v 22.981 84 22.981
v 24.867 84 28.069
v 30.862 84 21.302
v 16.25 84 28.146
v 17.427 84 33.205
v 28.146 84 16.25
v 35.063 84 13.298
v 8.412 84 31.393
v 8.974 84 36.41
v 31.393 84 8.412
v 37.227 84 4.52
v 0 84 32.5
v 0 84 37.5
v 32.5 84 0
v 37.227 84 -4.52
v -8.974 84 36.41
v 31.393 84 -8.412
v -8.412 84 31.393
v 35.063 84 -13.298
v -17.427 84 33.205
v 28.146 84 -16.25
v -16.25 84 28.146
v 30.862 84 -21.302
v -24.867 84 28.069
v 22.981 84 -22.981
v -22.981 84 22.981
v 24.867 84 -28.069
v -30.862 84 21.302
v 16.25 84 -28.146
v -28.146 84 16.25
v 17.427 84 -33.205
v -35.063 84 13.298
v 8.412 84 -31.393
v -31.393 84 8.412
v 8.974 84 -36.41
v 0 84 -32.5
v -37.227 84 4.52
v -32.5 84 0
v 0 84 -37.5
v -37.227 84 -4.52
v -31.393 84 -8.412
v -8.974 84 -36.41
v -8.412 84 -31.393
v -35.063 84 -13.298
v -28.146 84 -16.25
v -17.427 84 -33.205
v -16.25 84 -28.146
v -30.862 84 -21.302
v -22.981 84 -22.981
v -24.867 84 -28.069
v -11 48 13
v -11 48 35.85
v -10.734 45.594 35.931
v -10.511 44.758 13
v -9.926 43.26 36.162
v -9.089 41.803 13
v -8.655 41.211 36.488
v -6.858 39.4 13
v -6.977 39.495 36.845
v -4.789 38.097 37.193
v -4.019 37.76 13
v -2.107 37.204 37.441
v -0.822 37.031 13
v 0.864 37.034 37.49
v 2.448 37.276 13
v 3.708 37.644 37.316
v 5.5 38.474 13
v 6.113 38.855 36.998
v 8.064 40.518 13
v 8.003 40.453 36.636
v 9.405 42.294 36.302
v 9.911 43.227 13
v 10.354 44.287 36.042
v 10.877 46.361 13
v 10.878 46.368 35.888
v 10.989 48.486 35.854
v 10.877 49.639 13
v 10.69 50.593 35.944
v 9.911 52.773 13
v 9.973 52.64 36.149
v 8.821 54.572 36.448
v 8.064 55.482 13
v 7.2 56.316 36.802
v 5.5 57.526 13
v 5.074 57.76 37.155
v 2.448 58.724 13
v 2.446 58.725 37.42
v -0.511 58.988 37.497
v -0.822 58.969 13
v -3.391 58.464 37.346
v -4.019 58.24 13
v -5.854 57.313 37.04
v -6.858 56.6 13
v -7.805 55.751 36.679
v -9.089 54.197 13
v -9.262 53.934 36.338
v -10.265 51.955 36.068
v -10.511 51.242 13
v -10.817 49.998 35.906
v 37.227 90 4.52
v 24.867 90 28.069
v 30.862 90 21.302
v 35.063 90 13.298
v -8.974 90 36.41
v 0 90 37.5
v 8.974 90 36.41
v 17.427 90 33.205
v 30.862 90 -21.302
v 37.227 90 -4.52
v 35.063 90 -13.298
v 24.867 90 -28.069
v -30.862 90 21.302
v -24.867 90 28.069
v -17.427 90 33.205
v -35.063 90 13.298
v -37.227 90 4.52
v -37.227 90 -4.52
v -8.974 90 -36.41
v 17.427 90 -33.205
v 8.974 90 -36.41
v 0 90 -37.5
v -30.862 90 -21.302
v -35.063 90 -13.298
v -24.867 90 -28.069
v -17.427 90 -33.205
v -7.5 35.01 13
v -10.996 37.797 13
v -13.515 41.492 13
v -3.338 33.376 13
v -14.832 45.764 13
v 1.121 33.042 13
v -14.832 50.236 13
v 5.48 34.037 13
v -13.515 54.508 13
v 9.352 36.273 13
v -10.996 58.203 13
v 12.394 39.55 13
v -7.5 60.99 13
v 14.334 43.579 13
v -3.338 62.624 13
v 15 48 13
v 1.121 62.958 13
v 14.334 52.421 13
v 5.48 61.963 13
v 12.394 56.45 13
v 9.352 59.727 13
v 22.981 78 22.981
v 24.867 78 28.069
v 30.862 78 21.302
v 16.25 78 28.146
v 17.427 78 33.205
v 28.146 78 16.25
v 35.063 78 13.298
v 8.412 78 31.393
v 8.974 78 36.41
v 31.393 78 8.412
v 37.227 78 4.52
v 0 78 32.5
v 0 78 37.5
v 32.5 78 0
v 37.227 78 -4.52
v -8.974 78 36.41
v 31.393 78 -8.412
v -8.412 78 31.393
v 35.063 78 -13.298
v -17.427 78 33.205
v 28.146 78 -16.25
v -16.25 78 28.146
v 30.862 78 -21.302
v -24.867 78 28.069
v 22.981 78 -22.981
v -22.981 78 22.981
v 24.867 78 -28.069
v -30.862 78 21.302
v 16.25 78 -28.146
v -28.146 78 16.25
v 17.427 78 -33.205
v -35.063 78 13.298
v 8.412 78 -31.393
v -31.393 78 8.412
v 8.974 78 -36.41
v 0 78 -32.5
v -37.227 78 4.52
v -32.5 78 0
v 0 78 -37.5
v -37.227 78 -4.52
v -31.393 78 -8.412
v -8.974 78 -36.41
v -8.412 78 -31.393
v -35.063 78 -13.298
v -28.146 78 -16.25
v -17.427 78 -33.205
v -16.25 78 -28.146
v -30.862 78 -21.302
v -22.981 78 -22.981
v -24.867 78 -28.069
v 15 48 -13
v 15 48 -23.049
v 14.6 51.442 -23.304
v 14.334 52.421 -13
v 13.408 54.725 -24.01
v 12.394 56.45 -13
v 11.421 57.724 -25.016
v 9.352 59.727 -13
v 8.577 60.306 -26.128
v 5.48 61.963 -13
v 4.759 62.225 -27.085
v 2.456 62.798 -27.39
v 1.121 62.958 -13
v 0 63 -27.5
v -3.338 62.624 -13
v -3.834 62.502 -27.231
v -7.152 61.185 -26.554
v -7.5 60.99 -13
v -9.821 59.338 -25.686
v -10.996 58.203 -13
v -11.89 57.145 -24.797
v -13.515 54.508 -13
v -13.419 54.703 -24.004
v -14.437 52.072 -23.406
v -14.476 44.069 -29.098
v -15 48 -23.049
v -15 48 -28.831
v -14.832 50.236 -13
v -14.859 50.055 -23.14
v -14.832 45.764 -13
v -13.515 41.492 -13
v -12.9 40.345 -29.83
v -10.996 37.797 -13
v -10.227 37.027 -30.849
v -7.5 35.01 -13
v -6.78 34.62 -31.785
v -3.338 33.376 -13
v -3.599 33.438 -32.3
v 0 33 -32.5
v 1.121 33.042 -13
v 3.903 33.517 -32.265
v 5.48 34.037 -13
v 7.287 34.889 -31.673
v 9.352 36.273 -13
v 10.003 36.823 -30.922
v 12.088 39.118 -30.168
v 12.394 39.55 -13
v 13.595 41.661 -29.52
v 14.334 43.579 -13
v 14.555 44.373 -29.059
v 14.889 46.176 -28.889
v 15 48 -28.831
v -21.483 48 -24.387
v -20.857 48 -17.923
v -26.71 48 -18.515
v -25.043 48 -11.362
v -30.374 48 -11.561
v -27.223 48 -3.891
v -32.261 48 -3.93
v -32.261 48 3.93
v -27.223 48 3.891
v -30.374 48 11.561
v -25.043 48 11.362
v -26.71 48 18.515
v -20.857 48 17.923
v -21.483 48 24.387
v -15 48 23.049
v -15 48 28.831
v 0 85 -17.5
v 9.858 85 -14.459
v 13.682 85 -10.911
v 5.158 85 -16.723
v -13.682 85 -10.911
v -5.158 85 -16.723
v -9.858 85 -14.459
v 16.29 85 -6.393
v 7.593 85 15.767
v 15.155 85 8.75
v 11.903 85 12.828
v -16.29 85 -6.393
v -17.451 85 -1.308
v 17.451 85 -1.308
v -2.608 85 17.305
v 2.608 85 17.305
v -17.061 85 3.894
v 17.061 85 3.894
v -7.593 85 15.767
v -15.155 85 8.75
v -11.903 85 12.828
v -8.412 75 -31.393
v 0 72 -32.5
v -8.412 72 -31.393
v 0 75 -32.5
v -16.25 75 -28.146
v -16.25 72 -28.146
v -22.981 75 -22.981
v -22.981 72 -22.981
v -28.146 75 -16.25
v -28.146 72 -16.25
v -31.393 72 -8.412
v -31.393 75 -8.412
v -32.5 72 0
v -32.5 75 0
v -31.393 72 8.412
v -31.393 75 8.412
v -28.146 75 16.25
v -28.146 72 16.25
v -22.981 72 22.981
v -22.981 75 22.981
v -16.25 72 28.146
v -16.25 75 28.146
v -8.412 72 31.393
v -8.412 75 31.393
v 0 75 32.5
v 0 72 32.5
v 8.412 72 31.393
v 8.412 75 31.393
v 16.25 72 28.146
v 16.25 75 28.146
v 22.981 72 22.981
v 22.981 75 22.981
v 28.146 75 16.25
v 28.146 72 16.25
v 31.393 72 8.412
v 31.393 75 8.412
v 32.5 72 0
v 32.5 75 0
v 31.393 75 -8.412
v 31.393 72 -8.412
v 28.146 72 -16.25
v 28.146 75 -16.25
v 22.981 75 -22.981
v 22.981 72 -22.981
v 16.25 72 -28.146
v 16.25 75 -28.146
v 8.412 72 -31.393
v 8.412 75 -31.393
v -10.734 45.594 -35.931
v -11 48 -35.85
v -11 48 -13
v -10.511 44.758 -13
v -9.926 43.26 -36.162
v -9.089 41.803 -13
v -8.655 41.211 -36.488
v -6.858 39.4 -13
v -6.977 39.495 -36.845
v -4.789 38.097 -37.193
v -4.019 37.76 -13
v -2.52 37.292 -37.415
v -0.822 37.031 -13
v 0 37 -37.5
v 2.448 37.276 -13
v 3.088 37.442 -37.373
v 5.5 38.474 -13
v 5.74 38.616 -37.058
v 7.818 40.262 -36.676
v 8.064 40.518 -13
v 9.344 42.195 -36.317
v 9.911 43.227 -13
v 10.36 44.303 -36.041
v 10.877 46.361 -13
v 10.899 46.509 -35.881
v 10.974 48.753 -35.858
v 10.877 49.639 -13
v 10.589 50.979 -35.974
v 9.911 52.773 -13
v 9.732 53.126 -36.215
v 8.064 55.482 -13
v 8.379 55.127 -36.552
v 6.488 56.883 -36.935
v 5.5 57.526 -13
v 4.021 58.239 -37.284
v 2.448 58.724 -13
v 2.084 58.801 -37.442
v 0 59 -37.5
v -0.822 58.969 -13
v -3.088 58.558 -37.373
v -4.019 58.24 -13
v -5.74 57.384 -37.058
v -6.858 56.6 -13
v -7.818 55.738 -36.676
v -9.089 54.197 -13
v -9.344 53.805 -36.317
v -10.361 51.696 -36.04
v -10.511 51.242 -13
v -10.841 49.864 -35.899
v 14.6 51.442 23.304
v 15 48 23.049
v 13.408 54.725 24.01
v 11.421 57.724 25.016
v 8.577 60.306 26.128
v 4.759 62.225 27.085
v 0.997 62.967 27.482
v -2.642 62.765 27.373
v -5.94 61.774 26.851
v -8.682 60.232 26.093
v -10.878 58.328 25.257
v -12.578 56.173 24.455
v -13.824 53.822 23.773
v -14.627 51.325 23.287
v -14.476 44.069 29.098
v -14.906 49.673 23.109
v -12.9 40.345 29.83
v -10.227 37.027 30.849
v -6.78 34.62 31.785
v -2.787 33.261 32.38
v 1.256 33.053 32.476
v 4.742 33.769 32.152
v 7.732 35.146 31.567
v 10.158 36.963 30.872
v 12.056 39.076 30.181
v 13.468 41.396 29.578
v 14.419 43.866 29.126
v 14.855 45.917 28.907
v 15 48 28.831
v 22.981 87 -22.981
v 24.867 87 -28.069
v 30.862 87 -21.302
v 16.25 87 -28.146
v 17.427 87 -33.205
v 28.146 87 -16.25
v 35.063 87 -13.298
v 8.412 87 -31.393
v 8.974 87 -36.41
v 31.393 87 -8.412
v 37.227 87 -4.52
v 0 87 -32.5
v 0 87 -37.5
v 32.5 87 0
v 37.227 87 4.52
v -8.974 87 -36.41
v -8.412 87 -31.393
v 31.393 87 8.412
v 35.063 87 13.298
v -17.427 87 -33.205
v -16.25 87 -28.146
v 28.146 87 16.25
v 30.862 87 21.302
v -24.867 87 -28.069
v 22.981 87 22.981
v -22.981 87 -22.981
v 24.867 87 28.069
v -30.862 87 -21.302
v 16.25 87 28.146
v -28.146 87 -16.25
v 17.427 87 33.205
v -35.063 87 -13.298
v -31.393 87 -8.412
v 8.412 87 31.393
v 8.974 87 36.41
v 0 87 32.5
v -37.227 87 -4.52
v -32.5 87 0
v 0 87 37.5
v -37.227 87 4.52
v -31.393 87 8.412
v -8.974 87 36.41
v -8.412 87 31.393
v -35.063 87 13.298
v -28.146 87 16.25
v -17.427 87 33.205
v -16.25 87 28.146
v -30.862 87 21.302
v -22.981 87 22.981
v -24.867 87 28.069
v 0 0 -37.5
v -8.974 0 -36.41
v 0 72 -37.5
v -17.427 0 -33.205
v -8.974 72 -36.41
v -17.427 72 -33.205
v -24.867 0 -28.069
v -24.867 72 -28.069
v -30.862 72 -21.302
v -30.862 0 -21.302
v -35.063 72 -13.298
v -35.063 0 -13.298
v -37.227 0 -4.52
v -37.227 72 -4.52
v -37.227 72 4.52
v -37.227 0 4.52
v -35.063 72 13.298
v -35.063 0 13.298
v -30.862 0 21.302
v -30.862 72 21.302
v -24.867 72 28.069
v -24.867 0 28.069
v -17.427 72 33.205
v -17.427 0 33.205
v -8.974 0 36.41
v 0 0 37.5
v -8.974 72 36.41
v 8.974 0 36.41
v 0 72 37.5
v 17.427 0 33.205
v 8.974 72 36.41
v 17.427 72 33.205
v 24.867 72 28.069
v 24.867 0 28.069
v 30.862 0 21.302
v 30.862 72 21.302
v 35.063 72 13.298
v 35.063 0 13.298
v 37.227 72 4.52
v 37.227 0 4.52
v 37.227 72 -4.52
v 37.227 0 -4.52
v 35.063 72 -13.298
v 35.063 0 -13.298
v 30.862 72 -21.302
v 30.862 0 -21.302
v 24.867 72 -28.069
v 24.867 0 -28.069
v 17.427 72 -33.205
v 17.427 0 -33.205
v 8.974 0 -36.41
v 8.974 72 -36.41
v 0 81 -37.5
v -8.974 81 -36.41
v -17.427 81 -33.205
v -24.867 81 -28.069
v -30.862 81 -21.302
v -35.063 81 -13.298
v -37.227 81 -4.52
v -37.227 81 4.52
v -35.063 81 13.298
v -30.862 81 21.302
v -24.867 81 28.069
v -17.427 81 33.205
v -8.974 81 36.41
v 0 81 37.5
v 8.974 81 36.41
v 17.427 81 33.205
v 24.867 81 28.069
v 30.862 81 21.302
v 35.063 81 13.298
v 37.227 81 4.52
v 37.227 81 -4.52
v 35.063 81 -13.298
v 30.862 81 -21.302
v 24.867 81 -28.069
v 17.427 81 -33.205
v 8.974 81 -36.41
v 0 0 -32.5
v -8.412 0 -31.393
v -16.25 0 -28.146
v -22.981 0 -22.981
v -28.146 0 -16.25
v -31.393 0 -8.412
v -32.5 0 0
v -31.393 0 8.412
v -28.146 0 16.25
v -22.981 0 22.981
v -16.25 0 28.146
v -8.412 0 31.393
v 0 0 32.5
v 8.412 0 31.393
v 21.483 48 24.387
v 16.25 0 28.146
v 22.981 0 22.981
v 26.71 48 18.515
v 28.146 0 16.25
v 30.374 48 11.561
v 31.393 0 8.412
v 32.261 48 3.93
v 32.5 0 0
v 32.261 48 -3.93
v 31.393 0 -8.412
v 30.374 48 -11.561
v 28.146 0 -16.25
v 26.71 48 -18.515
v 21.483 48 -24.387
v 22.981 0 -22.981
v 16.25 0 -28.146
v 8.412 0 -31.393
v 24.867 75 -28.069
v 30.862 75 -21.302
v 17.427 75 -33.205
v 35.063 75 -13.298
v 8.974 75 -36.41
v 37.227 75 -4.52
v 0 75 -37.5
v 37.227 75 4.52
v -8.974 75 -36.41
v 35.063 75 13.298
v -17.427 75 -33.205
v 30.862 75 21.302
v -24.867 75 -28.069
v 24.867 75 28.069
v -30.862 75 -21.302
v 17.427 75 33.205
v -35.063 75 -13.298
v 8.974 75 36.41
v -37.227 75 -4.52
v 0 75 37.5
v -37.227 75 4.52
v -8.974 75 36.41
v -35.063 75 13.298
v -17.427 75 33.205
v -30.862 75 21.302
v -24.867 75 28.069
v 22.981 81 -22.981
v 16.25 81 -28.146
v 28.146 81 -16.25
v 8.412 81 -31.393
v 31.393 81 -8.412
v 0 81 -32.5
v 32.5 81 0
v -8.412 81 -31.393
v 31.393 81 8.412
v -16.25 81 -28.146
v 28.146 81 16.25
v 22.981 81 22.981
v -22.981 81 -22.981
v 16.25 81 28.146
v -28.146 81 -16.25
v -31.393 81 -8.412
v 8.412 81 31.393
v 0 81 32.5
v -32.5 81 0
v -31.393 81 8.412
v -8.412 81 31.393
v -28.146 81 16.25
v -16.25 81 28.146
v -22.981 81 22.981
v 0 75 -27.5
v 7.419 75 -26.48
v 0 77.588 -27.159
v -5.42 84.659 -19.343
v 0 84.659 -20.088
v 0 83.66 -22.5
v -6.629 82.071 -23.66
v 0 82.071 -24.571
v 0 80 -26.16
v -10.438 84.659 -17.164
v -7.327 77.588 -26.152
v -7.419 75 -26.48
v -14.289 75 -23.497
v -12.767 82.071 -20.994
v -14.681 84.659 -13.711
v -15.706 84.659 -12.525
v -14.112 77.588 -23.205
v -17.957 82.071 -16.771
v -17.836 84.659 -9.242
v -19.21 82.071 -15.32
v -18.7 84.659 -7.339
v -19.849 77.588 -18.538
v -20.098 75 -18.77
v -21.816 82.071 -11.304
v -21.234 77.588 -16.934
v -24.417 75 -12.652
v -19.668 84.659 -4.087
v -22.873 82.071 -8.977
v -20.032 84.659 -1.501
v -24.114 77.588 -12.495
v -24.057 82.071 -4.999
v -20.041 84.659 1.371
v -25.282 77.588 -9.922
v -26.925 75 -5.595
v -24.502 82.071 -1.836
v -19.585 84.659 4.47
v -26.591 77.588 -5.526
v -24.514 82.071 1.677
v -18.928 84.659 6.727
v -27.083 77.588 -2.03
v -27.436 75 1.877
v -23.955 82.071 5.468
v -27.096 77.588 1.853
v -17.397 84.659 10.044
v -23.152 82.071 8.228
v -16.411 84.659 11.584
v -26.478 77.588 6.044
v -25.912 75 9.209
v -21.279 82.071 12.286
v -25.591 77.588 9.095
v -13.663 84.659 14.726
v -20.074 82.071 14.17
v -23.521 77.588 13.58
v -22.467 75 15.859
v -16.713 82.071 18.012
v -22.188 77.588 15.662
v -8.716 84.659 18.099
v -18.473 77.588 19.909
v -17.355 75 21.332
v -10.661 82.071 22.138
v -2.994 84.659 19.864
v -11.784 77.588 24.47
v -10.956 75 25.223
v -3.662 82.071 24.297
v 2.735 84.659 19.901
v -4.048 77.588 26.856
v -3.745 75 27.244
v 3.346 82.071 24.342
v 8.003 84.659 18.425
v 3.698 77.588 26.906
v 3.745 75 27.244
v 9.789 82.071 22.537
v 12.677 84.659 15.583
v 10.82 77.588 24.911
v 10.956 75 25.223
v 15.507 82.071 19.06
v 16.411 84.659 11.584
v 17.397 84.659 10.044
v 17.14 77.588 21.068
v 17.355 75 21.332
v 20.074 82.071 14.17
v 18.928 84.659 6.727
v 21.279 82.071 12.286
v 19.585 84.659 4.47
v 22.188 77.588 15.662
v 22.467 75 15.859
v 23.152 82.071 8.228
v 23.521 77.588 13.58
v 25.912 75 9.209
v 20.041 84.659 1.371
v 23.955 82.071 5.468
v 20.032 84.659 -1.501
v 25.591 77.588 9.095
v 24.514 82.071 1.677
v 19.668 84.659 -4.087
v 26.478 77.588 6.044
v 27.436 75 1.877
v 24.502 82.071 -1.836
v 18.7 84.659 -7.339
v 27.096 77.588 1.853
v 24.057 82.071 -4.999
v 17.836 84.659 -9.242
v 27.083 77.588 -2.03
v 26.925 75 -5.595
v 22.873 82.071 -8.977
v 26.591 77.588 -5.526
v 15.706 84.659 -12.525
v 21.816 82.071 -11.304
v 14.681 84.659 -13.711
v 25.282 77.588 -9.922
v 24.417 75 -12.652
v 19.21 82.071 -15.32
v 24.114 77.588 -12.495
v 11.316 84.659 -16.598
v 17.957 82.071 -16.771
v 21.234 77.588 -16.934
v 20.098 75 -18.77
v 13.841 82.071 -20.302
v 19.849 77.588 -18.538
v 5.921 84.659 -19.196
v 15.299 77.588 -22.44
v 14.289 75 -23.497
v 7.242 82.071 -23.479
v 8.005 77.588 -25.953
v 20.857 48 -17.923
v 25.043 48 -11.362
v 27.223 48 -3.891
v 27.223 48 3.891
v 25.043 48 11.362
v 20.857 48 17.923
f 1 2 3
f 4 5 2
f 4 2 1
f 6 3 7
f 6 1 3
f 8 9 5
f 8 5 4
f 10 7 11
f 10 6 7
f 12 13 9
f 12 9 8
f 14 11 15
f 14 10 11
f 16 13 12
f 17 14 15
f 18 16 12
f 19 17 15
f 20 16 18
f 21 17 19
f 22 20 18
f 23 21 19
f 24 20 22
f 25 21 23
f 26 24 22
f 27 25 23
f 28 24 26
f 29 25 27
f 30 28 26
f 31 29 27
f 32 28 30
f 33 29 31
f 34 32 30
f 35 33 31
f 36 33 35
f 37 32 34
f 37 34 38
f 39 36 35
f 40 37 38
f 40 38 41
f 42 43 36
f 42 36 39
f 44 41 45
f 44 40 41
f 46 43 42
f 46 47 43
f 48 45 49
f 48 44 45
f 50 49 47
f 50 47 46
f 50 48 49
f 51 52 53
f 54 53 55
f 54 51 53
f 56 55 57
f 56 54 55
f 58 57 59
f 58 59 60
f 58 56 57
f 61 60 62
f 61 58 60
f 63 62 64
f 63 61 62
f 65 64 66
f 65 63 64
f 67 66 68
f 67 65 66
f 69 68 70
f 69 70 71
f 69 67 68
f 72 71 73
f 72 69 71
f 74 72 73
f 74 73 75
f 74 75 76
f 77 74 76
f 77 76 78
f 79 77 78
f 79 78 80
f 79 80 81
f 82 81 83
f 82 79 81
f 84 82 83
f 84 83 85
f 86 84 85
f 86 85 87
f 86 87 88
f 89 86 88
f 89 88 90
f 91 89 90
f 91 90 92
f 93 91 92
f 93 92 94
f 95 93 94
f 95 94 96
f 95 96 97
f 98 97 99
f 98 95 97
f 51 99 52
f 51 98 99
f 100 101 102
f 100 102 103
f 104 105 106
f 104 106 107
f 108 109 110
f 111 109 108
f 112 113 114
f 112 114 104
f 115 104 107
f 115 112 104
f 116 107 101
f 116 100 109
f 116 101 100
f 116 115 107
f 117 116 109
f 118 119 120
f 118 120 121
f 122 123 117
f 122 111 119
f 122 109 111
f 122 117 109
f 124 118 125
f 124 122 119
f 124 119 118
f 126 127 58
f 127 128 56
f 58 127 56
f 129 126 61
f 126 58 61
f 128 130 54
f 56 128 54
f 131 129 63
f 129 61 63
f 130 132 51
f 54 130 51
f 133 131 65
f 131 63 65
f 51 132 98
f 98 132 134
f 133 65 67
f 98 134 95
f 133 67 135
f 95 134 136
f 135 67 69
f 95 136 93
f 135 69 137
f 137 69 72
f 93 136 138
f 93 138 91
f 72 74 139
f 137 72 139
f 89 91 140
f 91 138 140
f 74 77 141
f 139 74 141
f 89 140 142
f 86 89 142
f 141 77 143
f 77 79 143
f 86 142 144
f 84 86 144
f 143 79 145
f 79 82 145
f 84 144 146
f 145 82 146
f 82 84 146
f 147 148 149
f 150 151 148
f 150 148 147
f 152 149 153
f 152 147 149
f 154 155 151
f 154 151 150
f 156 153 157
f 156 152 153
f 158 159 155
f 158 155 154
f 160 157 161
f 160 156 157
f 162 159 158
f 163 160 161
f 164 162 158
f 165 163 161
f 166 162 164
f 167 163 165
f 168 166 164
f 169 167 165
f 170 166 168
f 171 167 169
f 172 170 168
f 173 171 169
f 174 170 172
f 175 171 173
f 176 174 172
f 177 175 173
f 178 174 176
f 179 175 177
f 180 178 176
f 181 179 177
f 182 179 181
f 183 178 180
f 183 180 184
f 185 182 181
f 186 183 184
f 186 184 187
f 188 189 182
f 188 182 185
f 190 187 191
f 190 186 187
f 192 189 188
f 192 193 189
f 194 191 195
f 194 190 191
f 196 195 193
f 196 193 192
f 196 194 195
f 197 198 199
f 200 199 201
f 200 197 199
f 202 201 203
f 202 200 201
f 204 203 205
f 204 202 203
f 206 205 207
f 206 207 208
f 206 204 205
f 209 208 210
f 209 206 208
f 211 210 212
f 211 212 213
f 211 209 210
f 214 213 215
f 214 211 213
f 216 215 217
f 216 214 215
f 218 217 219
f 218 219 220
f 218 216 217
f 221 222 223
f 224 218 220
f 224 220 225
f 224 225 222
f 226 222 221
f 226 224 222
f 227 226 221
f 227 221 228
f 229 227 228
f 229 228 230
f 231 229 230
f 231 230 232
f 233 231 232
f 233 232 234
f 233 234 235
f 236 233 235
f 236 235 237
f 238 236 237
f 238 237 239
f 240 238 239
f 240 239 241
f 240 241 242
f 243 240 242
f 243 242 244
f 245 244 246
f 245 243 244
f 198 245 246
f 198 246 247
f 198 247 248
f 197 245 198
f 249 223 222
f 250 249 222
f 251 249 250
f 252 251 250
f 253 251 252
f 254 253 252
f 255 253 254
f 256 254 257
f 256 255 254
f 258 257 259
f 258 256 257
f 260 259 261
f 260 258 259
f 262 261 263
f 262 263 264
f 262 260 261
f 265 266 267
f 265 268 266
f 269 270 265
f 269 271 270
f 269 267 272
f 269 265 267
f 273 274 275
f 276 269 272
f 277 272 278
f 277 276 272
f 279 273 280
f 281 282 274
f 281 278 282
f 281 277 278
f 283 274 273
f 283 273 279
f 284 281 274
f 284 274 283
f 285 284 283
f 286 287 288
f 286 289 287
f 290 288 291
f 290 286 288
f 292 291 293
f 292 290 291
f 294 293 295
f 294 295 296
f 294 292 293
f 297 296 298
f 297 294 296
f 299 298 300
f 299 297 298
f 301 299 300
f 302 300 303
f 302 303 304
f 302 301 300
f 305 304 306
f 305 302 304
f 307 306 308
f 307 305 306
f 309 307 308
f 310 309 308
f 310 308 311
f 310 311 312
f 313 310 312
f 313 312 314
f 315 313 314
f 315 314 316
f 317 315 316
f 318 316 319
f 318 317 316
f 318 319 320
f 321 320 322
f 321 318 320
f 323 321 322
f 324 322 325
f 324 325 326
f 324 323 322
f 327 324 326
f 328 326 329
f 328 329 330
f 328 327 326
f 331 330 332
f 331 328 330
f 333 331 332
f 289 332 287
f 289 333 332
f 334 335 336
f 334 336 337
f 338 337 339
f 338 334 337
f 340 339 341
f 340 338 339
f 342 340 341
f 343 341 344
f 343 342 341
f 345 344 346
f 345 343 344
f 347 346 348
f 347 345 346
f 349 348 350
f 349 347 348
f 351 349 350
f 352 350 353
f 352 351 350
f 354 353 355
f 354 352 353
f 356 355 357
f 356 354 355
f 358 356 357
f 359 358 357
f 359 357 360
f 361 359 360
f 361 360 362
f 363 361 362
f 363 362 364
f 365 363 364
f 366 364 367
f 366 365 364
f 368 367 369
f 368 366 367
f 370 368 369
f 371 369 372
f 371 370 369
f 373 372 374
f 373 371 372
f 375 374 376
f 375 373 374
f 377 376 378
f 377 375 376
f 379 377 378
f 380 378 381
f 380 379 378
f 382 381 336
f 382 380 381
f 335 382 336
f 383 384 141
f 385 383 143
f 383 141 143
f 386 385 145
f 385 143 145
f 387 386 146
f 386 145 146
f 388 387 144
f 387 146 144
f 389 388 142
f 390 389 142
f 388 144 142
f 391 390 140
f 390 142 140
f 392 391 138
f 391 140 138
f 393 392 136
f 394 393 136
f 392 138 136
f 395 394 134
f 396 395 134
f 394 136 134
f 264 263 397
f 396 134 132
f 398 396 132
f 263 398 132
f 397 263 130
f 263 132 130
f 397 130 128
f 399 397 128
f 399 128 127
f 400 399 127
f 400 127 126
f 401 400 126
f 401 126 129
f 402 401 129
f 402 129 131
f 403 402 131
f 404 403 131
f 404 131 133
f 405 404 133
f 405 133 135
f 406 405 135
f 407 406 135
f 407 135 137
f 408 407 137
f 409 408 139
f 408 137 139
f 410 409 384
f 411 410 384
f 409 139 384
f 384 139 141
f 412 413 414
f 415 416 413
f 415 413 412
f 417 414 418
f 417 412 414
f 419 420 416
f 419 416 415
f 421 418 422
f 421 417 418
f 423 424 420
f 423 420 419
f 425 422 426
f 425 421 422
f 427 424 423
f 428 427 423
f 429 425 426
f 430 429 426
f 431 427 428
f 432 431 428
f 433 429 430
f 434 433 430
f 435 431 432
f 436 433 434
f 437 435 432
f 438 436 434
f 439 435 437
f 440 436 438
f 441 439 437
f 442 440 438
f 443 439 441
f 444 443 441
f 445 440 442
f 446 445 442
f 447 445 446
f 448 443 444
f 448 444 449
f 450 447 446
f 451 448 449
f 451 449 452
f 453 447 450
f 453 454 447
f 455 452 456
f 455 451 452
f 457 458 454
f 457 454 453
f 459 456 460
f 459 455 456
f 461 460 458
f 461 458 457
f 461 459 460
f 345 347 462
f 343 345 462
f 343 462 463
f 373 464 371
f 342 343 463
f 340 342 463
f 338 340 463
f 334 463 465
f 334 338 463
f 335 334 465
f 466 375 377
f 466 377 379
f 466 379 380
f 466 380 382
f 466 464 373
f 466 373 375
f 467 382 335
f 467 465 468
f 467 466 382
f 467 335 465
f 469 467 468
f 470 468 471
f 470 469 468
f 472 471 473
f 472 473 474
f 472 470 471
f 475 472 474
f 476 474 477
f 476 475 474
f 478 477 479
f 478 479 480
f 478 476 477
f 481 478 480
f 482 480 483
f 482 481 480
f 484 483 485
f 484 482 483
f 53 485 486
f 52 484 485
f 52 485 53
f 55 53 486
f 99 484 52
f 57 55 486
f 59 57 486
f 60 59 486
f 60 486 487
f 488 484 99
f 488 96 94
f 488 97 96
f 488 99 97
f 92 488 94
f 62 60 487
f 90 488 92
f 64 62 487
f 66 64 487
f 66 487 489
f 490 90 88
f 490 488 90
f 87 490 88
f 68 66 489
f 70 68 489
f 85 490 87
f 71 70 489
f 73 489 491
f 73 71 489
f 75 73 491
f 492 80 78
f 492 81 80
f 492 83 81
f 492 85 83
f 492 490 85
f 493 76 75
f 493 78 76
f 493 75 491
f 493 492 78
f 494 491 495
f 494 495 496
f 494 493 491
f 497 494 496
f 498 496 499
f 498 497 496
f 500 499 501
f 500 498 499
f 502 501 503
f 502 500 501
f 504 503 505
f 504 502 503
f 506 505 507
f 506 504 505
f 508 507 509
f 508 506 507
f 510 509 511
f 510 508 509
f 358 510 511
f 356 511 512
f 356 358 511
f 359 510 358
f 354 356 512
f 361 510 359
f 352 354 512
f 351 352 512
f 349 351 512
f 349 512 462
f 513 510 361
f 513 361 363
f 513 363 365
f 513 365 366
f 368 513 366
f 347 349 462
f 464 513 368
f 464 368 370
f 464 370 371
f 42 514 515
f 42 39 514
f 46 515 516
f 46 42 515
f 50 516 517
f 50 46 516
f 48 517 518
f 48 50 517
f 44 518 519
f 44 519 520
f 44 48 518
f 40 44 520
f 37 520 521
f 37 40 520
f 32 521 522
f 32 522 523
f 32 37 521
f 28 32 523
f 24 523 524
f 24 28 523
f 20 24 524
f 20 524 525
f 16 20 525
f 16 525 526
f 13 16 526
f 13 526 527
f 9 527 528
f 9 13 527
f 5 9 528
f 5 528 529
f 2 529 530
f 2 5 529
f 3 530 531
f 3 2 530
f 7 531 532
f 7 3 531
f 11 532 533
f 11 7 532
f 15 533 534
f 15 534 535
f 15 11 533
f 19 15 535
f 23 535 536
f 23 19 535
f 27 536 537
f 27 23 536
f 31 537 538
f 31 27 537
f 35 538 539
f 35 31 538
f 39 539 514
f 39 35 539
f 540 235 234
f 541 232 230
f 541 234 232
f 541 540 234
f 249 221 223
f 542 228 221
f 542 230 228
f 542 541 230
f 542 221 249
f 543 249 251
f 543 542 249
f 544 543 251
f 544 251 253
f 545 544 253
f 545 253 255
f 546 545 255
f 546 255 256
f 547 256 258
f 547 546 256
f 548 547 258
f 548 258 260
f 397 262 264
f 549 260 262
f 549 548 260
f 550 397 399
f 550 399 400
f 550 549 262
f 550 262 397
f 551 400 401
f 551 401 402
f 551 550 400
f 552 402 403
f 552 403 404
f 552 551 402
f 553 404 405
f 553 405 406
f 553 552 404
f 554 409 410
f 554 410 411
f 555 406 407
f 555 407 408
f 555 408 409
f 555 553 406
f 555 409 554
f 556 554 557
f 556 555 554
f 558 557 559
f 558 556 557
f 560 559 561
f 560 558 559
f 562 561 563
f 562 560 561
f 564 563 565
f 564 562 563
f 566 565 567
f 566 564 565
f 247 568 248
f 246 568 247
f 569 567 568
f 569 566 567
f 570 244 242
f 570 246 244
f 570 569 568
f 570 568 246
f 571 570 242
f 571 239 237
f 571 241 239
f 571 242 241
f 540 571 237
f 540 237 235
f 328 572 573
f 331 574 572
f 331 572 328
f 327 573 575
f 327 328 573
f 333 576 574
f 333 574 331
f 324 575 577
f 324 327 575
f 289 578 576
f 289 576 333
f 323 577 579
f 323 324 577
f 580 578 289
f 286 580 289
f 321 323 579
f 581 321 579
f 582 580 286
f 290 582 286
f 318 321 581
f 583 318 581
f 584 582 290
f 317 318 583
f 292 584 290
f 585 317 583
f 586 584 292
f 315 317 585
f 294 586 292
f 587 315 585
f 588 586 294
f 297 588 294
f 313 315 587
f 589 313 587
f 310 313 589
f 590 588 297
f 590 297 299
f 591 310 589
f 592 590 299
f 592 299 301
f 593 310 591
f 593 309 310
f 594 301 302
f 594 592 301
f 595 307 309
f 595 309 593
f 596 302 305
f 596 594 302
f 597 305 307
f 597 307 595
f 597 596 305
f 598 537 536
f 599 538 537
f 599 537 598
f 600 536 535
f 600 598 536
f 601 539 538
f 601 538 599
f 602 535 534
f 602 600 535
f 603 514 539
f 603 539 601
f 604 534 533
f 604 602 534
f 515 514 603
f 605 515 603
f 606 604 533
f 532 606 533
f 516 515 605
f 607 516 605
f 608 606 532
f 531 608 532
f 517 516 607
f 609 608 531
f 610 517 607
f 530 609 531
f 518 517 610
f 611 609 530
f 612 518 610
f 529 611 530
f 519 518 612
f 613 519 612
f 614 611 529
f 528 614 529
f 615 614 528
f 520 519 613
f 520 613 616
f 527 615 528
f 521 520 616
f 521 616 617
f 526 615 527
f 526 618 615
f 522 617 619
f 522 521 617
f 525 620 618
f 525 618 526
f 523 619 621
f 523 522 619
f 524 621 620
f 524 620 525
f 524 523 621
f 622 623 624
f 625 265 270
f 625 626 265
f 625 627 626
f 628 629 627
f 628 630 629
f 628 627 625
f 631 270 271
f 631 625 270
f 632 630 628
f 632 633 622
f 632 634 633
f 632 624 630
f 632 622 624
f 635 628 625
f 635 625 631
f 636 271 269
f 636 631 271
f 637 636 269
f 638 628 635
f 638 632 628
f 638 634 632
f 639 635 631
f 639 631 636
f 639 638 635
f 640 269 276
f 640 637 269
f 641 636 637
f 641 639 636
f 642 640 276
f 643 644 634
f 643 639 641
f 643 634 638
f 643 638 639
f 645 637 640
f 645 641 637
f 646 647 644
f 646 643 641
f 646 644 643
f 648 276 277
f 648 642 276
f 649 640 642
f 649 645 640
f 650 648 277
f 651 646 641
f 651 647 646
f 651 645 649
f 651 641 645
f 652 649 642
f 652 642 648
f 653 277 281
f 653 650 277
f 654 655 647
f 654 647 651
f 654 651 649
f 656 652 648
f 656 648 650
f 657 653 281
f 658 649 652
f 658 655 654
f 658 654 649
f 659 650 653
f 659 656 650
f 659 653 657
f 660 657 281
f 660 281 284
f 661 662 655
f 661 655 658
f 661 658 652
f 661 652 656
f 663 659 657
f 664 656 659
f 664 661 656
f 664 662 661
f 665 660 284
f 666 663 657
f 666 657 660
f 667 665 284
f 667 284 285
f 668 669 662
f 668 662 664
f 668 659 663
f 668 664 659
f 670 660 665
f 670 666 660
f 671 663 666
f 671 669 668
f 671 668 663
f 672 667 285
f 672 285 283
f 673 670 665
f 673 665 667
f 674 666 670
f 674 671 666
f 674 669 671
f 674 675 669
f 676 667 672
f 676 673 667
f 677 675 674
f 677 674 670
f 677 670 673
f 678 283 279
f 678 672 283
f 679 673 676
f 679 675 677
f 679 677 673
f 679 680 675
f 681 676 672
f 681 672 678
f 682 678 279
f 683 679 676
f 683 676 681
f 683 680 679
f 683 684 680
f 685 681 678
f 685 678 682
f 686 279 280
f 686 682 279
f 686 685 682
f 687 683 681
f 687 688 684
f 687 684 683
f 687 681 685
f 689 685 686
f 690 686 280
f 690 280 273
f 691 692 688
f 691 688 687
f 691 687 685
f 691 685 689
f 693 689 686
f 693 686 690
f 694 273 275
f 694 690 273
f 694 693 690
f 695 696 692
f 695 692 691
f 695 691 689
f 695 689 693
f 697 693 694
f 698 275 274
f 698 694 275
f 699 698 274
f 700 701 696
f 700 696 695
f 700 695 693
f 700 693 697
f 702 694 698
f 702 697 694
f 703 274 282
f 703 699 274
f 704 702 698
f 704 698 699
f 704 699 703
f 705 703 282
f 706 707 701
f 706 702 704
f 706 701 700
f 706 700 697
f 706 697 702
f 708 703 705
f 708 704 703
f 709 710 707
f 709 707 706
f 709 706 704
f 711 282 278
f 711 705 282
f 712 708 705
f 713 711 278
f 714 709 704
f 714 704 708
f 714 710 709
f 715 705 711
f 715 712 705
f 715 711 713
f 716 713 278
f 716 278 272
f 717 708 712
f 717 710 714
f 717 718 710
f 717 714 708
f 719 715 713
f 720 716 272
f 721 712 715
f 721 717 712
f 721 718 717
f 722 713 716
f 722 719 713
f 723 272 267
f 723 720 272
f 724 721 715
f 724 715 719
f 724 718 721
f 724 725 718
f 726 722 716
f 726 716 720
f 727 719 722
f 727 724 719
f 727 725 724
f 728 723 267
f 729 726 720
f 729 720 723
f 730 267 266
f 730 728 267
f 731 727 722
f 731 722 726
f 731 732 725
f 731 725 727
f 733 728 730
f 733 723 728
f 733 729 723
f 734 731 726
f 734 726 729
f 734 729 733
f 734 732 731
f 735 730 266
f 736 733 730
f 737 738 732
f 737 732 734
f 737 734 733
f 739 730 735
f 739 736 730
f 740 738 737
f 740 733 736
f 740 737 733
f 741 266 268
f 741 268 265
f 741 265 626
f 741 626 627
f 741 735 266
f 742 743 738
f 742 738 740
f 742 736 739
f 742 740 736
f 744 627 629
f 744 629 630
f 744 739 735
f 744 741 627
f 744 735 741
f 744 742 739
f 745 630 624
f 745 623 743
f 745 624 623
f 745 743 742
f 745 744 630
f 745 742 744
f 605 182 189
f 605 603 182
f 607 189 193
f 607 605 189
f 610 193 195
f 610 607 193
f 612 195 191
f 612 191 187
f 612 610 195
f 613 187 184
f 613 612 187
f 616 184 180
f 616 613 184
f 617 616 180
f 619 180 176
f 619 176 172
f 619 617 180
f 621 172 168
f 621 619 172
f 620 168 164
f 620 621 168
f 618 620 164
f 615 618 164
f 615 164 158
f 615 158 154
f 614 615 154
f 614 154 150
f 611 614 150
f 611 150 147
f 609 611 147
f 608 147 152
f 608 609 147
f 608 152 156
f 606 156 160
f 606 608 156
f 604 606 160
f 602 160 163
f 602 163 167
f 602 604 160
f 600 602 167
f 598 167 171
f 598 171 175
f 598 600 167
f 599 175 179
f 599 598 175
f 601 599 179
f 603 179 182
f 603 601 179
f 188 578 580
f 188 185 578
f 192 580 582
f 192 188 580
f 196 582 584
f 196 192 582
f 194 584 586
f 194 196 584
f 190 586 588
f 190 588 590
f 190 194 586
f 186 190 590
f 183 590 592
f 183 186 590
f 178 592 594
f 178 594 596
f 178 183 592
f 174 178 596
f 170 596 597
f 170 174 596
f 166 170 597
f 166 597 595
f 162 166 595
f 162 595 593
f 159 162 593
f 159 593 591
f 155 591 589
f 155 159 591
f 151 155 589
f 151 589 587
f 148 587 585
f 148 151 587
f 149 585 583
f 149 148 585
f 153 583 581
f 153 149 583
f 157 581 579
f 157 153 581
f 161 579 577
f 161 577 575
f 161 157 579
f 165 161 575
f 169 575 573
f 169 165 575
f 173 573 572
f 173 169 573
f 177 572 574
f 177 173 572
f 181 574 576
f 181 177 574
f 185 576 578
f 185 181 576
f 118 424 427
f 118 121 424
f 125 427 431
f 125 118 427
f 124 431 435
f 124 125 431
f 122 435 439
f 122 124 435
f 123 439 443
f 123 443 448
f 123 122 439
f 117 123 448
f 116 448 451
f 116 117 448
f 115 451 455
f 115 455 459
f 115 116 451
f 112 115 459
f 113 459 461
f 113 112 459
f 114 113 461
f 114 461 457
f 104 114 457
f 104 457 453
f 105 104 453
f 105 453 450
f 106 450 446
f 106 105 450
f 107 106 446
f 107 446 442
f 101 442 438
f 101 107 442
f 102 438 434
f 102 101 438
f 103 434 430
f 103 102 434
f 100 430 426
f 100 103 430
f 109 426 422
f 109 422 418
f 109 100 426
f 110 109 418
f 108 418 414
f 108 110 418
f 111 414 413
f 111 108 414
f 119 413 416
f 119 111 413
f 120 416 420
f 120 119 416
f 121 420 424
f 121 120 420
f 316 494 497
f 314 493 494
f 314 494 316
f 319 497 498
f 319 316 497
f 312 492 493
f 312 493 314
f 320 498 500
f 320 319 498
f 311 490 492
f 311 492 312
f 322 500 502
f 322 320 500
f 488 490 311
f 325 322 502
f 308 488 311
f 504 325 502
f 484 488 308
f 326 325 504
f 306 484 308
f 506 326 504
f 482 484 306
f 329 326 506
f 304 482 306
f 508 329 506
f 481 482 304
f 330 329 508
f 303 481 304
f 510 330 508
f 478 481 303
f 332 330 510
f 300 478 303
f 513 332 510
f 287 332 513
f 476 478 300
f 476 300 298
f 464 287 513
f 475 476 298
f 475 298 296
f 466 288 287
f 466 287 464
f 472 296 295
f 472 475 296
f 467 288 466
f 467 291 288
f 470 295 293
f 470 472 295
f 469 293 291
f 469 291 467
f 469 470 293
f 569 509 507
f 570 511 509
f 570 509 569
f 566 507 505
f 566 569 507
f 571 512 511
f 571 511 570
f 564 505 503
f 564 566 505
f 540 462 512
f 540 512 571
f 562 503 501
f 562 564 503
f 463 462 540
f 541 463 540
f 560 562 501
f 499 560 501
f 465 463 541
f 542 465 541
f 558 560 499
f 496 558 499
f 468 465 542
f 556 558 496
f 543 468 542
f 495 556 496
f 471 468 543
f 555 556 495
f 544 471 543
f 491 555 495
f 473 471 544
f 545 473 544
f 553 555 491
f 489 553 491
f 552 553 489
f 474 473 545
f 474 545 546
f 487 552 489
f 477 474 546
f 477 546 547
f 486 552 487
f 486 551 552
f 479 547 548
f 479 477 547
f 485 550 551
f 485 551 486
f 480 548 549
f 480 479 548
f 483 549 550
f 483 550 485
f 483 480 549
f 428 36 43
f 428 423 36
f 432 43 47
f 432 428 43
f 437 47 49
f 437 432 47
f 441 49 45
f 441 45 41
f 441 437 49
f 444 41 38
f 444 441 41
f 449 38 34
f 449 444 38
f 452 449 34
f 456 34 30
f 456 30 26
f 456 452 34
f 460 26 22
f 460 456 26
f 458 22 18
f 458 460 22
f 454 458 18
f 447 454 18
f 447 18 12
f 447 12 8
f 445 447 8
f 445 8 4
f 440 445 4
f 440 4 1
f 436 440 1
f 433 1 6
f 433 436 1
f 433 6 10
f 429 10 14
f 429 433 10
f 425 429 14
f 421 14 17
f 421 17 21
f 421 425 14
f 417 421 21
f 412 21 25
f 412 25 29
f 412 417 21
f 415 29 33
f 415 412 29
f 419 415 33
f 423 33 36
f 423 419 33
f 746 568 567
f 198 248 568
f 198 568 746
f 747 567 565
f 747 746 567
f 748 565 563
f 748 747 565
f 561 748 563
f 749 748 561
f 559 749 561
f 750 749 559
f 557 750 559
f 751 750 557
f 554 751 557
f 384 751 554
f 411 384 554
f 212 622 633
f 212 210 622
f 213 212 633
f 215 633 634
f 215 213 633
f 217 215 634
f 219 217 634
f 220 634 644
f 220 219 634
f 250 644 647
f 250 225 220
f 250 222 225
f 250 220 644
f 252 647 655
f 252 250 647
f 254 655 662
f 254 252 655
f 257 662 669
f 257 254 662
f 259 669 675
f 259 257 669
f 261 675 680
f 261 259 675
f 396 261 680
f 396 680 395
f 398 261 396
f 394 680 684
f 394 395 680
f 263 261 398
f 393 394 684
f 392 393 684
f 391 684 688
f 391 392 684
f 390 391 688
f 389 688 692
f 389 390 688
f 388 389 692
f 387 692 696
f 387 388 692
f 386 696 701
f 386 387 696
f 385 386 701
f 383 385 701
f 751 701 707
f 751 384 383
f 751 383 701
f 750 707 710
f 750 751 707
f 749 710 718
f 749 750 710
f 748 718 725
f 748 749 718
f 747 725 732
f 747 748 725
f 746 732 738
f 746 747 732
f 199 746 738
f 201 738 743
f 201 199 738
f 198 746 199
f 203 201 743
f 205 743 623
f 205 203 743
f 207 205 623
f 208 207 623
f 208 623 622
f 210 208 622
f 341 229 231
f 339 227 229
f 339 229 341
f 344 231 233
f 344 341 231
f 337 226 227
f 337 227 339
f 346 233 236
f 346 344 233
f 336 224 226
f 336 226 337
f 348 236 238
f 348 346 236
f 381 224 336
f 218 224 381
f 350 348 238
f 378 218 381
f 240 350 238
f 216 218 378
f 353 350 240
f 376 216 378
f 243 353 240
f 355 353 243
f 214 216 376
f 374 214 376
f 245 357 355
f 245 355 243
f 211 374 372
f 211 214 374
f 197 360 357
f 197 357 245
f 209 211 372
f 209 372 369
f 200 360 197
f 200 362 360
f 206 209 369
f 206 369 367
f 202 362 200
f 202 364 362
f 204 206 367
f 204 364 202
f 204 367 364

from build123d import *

# Parameters (mm, degrees)
BOSS_EXTRUDE4_REACH      = 119.463
BOSS_EXTRUDE4_END_RADIUS = 37.5
BOSS_EXTRUDE4_START      = -13
SKETCH2_R                = 15
BOSS_EXTRUDE5_REACH      = 119.463
BOSS_EXTRUDE5_END_RADIUS = 37.5
BOSS_EXTRUDE5_START      = 13
SKETCH2_3_R              = 15
CUT_EXTRUDE2_DEPTH       = 50
CUT_EXTRUDE2_DEPTH_BACK  = 50
SKETCH4_R                = 11


with BuildPart() as part:
    # Sketch1 → Revolve1 (revolve)
    with BuildSketch(Plane.XY):
        with BuildLine():
            Line((32.5, 0), (37.5, 0))
            Line((37.5, 0), (37.5, 72))
            Line((37.5, 72), (32.5, 72))
            Line((32.5, 72), (32.5, 75))
            Line((32.5, 75), (37.5, 75))
            Line((37.5, 75), (37.5, 78))
            Line((37.5, 78), (32.5, 78))
            Line((32.5, 78), (32.5, 81))
            Line((32.5, 81), (37.5, 81))
            Line((37.5, 81), (37.5, 84))
            Line((37.5, 84), (32.5, 84))
            Line((32.5, 84), (32.5, 87))
            Line((32.5, 87), (37.5, 87))
            Line((37.5, 87), (37.5, 90))
            Line((37.5, 90), (0, 90))
            Line((0, 90), (0, 85))
            Line((0, 85), (17.5, 85))
            ThreePointArc((17.5, 85), (24.571067812, 82.071067812), (27.5, 75))
            Line((27.5, 75), (27.5, 48))
            Line((27.5, 48), (32.5, 48))
            Line((32.5, 48), (32.5, 0))
        make_face()
    revolve(axis=Axis((0, 0, 0), (0, 1, 0)))

    # Boss-Extrude4: up to this cylinder (the profile starts inside it)
    boss_extrude4_end = Plane(origin=(0, 48, 0), z_dir=(0, -1, 0)) * Cylinder(BOSS_EXTRUDE4_END_RADIUS, 314.926, mode=Mode.PRIVATE)
    # Sketch2 → Boss-Extrude4 (add, up to the surface)
    with BuildSketch(Plane.XY.offset(BOSS_EXTRUDE4_START), mode=Mode.PRIVATE) as boss_extrude4_sk1:
        with Locations((0, 48)):
            Circle(SKETCH2_R)
    boss_extrude4_tool1 = extrude(boss_extrude4_sk1.sketch, amount=-BOSS_EXTRUDE4_REACH, mode=Mode.PRIVATE) & boss_extrude4_end
    add(boss_extrude4_tool1.solids().sort_by_distance((0, 48, -13))[0])

    # Boss-Extrude5: up to this cylinder (the profile starts inside it)
    boss_extrude5_end = Plane(origin=(0, 48, 0), z_dir=(0, -1, 0)) * Cylinder(BOSS_EXTRUDE5_END_RADIUS, 314.926, mode=Mode.PRIVATE)
    # Sketch2<3> → Boss-Extrude5 (add, up to the surface)
    with BuildSketch(Plane.XY.offset(BOSS_EXTRUDE5_START), mode=Mode.PRIVATE) as boss_extrude5_sk1:
        with Locations((0, 48)):
            Circle(SKETCH2_3_R)
    boss_extrude5_tool1 = extrude(boss_extrude5_sk1.sketch, amount=BOSS_EXTRUDE5_REACH, mode=Mode.PRIVATE) & boss_extrude5_end
    add(boss_extrude5_tool1.solids().sort_by_distance((0, 48, 13))[0])

    # Sketch4 → Cut-Extrude2 (cut, two sides: drawn at the far end of the back side and taken through both)
    with BuildSketch(Plane.XY.offset(-CUT_EXTRUDE2_DEPTH_BACK)):
        with Locations((0, 48)):
            Circle(SKETCH4_R)
    extrude(amount=CUT_EXTRUDE2_DEPTH + CUT_EXTRUDE2_DEPTH_BACK, mode=Mode.SUBTRACT)


solid = part.part
